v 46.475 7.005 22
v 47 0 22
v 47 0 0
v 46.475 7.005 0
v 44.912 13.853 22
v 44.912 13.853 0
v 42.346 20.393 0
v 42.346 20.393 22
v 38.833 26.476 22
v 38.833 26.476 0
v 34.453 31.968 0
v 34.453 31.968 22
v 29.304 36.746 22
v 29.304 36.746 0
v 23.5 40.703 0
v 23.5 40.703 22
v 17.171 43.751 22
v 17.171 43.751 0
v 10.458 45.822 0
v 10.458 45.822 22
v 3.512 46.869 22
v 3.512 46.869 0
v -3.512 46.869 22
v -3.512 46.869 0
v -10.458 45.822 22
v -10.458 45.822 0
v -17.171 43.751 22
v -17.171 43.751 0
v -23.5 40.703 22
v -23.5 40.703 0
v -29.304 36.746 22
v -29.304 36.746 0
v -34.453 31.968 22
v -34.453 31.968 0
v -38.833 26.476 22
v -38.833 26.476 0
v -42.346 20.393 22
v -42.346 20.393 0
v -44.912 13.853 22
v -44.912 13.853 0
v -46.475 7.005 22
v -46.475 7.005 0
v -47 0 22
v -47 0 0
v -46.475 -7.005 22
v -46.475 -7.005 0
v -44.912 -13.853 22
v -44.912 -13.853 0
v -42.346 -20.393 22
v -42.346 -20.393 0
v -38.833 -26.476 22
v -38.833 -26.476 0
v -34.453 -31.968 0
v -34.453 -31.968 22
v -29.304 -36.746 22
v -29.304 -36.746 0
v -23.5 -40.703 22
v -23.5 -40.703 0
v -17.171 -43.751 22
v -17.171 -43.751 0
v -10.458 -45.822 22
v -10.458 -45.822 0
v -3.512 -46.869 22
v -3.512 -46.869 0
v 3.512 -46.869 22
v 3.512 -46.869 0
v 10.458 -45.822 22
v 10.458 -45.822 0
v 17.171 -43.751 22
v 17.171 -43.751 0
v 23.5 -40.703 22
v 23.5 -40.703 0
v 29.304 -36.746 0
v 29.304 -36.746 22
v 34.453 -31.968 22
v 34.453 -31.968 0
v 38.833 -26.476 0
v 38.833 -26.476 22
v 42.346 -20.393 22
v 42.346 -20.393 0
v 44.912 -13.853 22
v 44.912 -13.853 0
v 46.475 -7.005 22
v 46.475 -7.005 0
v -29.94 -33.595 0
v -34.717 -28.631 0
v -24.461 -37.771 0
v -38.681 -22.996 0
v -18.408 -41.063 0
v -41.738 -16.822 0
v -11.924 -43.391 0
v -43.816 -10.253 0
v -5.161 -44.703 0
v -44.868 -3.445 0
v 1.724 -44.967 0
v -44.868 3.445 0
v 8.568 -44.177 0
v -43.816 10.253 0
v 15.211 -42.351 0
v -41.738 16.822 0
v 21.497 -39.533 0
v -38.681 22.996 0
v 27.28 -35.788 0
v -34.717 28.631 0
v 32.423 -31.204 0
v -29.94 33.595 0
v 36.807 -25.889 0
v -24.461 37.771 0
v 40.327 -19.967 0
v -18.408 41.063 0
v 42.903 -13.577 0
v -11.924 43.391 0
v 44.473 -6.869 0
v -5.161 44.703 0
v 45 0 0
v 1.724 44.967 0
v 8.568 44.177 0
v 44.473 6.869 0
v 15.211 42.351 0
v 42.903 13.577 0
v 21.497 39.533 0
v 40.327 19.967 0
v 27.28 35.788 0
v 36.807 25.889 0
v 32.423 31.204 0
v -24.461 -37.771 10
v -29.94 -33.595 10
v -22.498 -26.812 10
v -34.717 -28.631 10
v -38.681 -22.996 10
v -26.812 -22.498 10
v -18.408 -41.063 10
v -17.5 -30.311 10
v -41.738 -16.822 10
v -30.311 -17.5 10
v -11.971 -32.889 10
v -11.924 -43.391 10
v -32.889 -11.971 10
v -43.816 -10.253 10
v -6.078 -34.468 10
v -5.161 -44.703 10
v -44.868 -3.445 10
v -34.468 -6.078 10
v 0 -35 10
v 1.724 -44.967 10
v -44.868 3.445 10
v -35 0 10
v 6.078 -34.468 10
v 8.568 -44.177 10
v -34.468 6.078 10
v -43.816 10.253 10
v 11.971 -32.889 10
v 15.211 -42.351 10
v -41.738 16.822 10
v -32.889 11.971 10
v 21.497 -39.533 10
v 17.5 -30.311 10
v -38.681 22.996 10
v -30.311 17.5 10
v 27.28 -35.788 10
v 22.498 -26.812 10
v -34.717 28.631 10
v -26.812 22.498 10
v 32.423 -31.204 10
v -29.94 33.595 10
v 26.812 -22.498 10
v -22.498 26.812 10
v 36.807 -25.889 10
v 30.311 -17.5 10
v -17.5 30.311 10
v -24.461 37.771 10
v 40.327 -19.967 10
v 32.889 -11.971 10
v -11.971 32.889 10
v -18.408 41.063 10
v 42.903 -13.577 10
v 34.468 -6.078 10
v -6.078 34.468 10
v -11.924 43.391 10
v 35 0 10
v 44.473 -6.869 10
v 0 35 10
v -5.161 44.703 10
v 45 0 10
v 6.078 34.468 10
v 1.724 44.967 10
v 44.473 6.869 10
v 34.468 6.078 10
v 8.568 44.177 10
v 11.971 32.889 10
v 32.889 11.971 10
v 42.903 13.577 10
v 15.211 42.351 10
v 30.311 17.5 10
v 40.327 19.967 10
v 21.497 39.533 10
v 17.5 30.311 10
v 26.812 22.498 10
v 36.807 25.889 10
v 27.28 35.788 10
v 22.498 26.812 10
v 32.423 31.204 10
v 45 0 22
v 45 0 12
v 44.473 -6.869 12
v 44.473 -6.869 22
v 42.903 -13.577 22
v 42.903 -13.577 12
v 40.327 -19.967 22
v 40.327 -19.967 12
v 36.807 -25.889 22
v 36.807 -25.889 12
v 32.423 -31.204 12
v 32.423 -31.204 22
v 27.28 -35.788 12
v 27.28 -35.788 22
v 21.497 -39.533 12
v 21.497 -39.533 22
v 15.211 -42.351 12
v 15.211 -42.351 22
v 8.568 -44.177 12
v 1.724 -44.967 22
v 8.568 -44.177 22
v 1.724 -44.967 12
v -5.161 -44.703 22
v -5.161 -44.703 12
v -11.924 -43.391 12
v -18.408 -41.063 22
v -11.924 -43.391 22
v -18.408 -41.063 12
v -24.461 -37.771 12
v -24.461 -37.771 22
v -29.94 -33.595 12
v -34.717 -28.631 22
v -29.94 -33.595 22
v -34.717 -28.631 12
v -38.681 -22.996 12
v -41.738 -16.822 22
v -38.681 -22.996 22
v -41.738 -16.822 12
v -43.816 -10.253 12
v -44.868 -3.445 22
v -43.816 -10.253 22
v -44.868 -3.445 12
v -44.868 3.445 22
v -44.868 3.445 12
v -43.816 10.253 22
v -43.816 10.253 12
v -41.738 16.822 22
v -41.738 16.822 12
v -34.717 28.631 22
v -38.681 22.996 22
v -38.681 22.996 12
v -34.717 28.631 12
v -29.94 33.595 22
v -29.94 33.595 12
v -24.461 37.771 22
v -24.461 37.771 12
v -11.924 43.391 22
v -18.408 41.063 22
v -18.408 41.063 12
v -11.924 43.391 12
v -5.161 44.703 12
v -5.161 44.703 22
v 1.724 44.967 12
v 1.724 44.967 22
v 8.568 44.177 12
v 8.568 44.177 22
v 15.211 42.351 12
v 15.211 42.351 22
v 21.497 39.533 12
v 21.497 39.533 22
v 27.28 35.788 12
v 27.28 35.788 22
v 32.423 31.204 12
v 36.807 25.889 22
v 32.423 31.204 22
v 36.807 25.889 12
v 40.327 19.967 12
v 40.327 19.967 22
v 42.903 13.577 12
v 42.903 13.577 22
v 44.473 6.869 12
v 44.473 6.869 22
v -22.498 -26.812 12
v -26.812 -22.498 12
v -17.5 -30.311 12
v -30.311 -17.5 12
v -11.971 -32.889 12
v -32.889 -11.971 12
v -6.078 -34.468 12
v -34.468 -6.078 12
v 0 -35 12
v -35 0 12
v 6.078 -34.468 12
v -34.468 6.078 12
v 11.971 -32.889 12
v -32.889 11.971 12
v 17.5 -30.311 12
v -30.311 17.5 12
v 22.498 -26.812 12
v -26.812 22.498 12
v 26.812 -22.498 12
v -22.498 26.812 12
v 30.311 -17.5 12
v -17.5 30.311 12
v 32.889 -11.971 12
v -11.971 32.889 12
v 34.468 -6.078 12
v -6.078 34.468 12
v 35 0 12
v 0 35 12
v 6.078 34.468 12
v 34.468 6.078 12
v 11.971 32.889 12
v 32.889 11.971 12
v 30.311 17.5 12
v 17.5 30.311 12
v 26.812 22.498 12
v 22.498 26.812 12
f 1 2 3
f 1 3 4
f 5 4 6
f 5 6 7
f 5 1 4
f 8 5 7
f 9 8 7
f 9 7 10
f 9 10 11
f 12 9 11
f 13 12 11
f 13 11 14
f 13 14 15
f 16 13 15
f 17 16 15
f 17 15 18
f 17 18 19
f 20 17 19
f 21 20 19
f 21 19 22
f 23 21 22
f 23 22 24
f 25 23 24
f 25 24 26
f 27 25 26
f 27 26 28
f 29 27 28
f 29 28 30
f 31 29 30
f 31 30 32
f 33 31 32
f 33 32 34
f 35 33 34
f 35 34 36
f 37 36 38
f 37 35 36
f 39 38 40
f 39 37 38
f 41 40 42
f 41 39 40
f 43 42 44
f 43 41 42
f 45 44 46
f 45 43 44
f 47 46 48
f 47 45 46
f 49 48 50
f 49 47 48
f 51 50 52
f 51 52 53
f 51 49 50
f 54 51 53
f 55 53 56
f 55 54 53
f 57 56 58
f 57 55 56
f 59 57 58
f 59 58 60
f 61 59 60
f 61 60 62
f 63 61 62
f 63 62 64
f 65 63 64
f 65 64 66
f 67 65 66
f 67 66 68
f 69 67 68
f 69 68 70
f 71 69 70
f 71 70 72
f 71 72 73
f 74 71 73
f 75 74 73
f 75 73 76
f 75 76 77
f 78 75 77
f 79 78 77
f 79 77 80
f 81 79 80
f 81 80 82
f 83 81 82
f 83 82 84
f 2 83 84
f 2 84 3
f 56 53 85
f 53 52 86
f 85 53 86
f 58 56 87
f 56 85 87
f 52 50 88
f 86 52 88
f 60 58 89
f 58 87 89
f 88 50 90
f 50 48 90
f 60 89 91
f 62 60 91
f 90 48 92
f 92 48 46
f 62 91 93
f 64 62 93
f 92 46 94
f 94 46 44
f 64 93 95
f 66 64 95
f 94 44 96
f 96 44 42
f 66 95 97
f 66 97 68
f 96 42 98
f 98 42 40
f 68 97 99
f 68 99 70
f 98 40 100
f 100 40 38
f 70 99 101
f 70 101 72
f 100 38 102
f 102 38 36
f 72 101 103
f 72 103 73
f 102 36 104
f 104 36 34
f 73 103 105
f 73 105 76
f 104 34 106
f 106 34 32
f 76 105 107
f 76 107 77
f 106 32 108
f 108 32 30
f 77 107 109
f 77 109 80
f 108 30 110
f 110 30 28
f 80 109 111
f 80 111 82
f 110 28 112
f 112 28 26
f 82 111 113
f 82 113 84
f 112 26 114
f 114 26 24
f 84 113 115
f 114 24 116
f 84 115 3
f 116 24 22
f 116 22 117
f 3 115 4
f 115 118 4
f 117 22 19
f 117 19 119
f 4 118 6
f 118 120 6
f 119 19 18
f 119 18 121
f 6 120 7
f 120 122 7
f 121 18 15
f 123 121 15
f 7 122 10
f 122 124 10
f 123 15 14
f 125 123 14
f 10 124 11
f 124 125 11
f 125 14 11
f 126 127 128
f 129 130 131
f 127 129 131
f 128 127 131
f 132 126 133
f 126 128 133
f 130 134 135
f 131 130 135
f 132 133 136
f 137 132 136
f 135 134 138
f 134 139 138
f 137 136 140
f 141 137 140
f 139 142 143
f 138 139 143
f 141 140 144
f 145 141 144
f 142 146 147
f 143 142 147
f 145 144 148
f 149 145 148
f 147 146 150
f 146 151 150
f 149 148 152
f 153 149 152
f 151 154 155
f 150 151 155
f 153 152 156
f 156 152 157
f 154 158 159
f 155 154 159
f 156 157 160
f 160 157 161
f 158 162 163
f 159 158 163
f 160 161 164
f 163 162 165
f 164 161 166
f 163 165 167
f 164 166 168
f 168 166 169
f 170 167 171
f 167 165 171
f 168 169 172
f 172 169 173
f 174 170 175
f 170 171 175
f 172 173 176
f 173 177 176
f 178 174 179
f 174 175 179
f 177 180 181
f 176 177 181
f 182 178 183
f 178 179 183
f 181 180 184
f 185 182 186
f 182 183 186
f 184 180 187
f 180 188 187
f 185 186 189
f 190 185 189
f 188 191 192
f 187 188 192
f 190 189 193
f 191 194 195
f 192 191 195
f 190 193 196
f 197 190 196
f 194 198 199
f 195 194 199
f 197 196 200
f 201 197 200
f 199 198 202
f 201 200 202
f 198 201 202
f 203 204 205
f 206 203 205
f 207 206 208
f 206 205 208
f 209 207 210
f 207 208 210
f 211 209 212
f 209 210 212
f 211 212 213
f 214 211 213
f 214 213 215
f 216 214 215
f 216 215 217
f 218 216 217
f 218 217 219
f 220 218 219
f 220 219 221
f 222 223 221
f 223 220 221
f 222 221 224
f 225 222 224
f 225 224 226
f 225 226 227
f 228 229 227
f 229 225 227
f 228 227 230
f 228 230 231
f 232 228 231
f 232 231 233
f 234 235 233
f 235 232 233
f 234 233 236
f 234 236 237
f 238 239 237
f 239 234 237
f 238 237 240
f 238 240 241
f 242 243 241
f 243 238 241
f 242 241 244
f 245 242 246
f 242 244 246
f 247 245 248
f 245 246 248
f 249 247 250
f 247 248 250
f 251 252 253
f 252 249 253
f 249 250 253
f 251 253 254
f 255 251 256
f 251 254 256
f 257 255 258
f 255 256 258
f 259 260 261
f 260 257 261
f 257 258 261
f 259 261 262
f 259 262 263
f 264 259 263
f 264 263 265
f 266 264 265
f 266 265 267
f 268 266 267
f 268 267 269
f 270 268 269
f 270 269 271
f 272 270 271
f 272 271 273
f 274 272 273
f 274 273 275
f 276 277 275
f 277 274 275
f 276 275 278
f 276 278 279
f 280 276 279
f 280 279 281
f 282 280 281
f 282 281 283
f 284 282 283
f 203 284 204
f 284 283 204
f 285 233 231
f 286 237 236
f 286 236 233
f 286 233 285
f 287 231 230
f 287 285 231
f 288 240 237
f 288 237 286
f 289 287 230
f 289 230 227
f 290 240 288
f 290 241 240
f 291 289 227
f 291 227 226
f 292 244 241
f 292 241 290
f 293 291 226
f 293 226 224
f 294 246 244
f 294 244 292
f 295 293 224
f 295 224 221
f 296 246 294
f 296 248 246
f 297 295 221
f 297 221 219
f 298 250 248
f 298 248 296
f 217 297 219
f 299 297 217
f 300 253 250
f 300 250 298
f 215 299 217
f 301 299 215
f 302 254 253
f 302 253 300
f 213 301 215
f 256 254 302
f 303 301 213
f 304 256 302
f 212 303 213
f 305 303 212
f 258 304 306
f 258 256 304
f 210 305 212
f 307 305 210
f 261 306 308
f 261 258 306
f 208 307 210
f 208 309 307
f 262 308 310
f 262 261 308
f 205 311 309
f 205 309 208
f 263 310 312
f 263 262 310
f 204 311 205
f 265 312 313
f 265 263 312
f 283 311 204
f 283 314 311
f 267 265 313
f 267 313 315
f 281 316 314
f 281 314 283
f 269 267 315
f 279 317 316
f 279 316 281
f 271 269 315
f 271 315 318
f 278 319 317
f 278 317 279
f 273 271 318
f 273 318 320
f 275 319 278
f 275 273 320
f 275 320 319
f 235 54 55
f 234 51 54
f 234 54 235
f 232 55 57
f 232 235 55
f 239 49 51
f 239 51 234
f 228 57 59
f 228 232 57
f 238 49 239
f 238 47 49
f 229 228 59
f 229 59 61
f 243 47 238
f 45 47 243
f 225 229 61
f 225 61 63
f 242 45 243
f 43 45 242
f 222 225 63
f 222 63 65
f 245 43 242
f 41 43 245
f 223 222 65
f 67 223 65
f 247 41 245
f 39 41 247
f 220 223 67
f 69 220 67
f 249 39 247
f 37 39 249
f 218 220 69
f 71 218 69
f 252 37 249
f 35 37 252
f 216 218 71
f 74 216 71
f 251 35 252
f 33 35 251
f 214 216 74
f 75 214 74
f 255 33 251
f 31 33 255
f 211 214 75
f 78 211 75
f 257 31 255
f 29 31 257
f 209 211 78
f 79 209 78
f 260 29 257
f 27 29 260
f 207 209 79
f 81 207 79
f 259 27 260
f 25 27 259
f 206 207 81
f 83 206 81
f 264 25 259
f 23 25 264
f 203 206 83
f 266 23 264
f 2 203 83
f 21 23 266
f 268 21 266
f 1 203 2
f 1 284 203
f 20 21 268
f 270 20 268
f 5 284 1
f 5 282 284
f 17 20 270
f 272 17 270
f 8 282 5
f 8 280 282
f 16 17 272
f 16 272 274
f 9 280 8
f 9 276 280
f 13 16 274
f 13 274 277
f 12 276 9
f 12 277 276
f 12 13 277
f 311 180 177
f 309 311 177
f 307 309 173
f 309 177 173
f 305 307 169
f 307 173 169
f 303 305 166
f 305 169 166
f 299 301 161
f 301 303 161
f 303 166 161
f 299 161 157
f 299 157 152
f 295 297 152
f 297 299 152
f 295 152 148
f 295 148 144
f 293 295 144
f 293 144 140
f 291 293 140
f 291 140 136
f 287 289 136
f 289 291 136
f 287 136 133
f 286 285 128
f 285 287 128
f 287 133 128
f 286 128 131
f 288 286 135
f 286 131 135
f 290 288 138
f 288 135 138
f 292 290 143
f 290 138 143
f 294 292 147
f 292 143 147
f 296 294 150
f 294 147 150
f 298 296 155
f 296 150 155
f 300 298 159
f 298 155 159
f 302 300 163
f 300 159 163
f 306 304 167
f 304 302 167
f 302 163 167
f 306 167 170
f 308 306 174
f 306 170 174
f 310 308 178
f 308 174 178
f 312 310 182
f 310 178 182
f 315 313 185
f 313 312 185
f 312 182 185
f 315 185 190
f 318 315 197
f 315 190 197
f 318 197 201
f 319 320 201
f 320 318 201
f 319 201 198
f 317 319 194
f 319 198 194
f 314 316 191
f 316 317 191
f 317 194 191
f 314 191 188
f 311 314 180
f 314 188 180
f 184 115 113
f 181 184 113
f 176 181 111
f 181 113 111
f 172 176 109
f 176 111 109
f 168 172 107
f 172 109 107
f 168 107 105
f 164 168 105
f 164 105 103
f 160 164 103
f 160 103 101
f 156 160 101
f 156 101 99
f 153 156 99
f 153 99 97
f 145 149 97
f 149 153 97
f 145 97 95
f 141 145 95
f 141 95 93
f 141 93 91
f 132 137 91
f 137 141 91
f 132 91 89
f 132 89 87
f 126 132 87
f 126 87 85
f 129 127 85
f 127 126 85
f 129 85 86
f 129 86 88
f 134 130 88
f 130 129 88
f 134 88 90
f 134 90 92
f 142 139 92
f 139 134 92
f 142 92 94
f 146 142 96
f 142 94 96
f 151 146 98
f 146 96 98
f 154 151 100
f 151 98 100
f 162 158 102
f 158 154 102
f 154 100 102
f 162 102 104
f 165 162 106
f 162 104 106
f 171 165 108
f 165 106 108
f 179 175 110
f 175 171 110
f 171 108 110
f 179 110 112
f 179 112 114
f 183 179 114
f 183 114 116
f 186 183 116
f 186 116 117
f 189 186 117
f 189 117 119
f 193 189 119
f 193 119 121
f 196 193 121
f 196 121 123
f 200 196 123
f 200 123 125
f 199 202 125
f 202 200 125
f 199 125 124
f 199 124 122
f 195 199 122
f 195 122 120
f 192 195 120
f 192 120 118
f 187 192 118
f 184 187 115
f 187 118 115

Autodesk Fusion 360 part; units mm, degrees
sketch "Sketch1" plane through (0, 0, 0) normal (0, 1, 0) x (1, 0, 0)
  line L0 (47, 0) -> (47, -22)
  line L1 (47, -22) -> (45, -22)
  line L2 (45, -22) -> (45, -12)
  line L3 (45, -12) -> (35, -12)
  line L4 (35, -12) -> (35, -10)
  line L5 (35, -10) -> (45, -10)
  line L6 (45, -10) -> (45, 0)
  line L7 (45, 0) -> (47, 0)
  dimension "d1" = 45
  dimension "d2" = 35
  dimension "d3" = 2
  dimension "d4" = 2
  dimension "d5" = 10
revolve "Revolve1" add sketch "Sketch1" angle 360 about axis through (0, 0, 1.75) along (0, 0, 1)
